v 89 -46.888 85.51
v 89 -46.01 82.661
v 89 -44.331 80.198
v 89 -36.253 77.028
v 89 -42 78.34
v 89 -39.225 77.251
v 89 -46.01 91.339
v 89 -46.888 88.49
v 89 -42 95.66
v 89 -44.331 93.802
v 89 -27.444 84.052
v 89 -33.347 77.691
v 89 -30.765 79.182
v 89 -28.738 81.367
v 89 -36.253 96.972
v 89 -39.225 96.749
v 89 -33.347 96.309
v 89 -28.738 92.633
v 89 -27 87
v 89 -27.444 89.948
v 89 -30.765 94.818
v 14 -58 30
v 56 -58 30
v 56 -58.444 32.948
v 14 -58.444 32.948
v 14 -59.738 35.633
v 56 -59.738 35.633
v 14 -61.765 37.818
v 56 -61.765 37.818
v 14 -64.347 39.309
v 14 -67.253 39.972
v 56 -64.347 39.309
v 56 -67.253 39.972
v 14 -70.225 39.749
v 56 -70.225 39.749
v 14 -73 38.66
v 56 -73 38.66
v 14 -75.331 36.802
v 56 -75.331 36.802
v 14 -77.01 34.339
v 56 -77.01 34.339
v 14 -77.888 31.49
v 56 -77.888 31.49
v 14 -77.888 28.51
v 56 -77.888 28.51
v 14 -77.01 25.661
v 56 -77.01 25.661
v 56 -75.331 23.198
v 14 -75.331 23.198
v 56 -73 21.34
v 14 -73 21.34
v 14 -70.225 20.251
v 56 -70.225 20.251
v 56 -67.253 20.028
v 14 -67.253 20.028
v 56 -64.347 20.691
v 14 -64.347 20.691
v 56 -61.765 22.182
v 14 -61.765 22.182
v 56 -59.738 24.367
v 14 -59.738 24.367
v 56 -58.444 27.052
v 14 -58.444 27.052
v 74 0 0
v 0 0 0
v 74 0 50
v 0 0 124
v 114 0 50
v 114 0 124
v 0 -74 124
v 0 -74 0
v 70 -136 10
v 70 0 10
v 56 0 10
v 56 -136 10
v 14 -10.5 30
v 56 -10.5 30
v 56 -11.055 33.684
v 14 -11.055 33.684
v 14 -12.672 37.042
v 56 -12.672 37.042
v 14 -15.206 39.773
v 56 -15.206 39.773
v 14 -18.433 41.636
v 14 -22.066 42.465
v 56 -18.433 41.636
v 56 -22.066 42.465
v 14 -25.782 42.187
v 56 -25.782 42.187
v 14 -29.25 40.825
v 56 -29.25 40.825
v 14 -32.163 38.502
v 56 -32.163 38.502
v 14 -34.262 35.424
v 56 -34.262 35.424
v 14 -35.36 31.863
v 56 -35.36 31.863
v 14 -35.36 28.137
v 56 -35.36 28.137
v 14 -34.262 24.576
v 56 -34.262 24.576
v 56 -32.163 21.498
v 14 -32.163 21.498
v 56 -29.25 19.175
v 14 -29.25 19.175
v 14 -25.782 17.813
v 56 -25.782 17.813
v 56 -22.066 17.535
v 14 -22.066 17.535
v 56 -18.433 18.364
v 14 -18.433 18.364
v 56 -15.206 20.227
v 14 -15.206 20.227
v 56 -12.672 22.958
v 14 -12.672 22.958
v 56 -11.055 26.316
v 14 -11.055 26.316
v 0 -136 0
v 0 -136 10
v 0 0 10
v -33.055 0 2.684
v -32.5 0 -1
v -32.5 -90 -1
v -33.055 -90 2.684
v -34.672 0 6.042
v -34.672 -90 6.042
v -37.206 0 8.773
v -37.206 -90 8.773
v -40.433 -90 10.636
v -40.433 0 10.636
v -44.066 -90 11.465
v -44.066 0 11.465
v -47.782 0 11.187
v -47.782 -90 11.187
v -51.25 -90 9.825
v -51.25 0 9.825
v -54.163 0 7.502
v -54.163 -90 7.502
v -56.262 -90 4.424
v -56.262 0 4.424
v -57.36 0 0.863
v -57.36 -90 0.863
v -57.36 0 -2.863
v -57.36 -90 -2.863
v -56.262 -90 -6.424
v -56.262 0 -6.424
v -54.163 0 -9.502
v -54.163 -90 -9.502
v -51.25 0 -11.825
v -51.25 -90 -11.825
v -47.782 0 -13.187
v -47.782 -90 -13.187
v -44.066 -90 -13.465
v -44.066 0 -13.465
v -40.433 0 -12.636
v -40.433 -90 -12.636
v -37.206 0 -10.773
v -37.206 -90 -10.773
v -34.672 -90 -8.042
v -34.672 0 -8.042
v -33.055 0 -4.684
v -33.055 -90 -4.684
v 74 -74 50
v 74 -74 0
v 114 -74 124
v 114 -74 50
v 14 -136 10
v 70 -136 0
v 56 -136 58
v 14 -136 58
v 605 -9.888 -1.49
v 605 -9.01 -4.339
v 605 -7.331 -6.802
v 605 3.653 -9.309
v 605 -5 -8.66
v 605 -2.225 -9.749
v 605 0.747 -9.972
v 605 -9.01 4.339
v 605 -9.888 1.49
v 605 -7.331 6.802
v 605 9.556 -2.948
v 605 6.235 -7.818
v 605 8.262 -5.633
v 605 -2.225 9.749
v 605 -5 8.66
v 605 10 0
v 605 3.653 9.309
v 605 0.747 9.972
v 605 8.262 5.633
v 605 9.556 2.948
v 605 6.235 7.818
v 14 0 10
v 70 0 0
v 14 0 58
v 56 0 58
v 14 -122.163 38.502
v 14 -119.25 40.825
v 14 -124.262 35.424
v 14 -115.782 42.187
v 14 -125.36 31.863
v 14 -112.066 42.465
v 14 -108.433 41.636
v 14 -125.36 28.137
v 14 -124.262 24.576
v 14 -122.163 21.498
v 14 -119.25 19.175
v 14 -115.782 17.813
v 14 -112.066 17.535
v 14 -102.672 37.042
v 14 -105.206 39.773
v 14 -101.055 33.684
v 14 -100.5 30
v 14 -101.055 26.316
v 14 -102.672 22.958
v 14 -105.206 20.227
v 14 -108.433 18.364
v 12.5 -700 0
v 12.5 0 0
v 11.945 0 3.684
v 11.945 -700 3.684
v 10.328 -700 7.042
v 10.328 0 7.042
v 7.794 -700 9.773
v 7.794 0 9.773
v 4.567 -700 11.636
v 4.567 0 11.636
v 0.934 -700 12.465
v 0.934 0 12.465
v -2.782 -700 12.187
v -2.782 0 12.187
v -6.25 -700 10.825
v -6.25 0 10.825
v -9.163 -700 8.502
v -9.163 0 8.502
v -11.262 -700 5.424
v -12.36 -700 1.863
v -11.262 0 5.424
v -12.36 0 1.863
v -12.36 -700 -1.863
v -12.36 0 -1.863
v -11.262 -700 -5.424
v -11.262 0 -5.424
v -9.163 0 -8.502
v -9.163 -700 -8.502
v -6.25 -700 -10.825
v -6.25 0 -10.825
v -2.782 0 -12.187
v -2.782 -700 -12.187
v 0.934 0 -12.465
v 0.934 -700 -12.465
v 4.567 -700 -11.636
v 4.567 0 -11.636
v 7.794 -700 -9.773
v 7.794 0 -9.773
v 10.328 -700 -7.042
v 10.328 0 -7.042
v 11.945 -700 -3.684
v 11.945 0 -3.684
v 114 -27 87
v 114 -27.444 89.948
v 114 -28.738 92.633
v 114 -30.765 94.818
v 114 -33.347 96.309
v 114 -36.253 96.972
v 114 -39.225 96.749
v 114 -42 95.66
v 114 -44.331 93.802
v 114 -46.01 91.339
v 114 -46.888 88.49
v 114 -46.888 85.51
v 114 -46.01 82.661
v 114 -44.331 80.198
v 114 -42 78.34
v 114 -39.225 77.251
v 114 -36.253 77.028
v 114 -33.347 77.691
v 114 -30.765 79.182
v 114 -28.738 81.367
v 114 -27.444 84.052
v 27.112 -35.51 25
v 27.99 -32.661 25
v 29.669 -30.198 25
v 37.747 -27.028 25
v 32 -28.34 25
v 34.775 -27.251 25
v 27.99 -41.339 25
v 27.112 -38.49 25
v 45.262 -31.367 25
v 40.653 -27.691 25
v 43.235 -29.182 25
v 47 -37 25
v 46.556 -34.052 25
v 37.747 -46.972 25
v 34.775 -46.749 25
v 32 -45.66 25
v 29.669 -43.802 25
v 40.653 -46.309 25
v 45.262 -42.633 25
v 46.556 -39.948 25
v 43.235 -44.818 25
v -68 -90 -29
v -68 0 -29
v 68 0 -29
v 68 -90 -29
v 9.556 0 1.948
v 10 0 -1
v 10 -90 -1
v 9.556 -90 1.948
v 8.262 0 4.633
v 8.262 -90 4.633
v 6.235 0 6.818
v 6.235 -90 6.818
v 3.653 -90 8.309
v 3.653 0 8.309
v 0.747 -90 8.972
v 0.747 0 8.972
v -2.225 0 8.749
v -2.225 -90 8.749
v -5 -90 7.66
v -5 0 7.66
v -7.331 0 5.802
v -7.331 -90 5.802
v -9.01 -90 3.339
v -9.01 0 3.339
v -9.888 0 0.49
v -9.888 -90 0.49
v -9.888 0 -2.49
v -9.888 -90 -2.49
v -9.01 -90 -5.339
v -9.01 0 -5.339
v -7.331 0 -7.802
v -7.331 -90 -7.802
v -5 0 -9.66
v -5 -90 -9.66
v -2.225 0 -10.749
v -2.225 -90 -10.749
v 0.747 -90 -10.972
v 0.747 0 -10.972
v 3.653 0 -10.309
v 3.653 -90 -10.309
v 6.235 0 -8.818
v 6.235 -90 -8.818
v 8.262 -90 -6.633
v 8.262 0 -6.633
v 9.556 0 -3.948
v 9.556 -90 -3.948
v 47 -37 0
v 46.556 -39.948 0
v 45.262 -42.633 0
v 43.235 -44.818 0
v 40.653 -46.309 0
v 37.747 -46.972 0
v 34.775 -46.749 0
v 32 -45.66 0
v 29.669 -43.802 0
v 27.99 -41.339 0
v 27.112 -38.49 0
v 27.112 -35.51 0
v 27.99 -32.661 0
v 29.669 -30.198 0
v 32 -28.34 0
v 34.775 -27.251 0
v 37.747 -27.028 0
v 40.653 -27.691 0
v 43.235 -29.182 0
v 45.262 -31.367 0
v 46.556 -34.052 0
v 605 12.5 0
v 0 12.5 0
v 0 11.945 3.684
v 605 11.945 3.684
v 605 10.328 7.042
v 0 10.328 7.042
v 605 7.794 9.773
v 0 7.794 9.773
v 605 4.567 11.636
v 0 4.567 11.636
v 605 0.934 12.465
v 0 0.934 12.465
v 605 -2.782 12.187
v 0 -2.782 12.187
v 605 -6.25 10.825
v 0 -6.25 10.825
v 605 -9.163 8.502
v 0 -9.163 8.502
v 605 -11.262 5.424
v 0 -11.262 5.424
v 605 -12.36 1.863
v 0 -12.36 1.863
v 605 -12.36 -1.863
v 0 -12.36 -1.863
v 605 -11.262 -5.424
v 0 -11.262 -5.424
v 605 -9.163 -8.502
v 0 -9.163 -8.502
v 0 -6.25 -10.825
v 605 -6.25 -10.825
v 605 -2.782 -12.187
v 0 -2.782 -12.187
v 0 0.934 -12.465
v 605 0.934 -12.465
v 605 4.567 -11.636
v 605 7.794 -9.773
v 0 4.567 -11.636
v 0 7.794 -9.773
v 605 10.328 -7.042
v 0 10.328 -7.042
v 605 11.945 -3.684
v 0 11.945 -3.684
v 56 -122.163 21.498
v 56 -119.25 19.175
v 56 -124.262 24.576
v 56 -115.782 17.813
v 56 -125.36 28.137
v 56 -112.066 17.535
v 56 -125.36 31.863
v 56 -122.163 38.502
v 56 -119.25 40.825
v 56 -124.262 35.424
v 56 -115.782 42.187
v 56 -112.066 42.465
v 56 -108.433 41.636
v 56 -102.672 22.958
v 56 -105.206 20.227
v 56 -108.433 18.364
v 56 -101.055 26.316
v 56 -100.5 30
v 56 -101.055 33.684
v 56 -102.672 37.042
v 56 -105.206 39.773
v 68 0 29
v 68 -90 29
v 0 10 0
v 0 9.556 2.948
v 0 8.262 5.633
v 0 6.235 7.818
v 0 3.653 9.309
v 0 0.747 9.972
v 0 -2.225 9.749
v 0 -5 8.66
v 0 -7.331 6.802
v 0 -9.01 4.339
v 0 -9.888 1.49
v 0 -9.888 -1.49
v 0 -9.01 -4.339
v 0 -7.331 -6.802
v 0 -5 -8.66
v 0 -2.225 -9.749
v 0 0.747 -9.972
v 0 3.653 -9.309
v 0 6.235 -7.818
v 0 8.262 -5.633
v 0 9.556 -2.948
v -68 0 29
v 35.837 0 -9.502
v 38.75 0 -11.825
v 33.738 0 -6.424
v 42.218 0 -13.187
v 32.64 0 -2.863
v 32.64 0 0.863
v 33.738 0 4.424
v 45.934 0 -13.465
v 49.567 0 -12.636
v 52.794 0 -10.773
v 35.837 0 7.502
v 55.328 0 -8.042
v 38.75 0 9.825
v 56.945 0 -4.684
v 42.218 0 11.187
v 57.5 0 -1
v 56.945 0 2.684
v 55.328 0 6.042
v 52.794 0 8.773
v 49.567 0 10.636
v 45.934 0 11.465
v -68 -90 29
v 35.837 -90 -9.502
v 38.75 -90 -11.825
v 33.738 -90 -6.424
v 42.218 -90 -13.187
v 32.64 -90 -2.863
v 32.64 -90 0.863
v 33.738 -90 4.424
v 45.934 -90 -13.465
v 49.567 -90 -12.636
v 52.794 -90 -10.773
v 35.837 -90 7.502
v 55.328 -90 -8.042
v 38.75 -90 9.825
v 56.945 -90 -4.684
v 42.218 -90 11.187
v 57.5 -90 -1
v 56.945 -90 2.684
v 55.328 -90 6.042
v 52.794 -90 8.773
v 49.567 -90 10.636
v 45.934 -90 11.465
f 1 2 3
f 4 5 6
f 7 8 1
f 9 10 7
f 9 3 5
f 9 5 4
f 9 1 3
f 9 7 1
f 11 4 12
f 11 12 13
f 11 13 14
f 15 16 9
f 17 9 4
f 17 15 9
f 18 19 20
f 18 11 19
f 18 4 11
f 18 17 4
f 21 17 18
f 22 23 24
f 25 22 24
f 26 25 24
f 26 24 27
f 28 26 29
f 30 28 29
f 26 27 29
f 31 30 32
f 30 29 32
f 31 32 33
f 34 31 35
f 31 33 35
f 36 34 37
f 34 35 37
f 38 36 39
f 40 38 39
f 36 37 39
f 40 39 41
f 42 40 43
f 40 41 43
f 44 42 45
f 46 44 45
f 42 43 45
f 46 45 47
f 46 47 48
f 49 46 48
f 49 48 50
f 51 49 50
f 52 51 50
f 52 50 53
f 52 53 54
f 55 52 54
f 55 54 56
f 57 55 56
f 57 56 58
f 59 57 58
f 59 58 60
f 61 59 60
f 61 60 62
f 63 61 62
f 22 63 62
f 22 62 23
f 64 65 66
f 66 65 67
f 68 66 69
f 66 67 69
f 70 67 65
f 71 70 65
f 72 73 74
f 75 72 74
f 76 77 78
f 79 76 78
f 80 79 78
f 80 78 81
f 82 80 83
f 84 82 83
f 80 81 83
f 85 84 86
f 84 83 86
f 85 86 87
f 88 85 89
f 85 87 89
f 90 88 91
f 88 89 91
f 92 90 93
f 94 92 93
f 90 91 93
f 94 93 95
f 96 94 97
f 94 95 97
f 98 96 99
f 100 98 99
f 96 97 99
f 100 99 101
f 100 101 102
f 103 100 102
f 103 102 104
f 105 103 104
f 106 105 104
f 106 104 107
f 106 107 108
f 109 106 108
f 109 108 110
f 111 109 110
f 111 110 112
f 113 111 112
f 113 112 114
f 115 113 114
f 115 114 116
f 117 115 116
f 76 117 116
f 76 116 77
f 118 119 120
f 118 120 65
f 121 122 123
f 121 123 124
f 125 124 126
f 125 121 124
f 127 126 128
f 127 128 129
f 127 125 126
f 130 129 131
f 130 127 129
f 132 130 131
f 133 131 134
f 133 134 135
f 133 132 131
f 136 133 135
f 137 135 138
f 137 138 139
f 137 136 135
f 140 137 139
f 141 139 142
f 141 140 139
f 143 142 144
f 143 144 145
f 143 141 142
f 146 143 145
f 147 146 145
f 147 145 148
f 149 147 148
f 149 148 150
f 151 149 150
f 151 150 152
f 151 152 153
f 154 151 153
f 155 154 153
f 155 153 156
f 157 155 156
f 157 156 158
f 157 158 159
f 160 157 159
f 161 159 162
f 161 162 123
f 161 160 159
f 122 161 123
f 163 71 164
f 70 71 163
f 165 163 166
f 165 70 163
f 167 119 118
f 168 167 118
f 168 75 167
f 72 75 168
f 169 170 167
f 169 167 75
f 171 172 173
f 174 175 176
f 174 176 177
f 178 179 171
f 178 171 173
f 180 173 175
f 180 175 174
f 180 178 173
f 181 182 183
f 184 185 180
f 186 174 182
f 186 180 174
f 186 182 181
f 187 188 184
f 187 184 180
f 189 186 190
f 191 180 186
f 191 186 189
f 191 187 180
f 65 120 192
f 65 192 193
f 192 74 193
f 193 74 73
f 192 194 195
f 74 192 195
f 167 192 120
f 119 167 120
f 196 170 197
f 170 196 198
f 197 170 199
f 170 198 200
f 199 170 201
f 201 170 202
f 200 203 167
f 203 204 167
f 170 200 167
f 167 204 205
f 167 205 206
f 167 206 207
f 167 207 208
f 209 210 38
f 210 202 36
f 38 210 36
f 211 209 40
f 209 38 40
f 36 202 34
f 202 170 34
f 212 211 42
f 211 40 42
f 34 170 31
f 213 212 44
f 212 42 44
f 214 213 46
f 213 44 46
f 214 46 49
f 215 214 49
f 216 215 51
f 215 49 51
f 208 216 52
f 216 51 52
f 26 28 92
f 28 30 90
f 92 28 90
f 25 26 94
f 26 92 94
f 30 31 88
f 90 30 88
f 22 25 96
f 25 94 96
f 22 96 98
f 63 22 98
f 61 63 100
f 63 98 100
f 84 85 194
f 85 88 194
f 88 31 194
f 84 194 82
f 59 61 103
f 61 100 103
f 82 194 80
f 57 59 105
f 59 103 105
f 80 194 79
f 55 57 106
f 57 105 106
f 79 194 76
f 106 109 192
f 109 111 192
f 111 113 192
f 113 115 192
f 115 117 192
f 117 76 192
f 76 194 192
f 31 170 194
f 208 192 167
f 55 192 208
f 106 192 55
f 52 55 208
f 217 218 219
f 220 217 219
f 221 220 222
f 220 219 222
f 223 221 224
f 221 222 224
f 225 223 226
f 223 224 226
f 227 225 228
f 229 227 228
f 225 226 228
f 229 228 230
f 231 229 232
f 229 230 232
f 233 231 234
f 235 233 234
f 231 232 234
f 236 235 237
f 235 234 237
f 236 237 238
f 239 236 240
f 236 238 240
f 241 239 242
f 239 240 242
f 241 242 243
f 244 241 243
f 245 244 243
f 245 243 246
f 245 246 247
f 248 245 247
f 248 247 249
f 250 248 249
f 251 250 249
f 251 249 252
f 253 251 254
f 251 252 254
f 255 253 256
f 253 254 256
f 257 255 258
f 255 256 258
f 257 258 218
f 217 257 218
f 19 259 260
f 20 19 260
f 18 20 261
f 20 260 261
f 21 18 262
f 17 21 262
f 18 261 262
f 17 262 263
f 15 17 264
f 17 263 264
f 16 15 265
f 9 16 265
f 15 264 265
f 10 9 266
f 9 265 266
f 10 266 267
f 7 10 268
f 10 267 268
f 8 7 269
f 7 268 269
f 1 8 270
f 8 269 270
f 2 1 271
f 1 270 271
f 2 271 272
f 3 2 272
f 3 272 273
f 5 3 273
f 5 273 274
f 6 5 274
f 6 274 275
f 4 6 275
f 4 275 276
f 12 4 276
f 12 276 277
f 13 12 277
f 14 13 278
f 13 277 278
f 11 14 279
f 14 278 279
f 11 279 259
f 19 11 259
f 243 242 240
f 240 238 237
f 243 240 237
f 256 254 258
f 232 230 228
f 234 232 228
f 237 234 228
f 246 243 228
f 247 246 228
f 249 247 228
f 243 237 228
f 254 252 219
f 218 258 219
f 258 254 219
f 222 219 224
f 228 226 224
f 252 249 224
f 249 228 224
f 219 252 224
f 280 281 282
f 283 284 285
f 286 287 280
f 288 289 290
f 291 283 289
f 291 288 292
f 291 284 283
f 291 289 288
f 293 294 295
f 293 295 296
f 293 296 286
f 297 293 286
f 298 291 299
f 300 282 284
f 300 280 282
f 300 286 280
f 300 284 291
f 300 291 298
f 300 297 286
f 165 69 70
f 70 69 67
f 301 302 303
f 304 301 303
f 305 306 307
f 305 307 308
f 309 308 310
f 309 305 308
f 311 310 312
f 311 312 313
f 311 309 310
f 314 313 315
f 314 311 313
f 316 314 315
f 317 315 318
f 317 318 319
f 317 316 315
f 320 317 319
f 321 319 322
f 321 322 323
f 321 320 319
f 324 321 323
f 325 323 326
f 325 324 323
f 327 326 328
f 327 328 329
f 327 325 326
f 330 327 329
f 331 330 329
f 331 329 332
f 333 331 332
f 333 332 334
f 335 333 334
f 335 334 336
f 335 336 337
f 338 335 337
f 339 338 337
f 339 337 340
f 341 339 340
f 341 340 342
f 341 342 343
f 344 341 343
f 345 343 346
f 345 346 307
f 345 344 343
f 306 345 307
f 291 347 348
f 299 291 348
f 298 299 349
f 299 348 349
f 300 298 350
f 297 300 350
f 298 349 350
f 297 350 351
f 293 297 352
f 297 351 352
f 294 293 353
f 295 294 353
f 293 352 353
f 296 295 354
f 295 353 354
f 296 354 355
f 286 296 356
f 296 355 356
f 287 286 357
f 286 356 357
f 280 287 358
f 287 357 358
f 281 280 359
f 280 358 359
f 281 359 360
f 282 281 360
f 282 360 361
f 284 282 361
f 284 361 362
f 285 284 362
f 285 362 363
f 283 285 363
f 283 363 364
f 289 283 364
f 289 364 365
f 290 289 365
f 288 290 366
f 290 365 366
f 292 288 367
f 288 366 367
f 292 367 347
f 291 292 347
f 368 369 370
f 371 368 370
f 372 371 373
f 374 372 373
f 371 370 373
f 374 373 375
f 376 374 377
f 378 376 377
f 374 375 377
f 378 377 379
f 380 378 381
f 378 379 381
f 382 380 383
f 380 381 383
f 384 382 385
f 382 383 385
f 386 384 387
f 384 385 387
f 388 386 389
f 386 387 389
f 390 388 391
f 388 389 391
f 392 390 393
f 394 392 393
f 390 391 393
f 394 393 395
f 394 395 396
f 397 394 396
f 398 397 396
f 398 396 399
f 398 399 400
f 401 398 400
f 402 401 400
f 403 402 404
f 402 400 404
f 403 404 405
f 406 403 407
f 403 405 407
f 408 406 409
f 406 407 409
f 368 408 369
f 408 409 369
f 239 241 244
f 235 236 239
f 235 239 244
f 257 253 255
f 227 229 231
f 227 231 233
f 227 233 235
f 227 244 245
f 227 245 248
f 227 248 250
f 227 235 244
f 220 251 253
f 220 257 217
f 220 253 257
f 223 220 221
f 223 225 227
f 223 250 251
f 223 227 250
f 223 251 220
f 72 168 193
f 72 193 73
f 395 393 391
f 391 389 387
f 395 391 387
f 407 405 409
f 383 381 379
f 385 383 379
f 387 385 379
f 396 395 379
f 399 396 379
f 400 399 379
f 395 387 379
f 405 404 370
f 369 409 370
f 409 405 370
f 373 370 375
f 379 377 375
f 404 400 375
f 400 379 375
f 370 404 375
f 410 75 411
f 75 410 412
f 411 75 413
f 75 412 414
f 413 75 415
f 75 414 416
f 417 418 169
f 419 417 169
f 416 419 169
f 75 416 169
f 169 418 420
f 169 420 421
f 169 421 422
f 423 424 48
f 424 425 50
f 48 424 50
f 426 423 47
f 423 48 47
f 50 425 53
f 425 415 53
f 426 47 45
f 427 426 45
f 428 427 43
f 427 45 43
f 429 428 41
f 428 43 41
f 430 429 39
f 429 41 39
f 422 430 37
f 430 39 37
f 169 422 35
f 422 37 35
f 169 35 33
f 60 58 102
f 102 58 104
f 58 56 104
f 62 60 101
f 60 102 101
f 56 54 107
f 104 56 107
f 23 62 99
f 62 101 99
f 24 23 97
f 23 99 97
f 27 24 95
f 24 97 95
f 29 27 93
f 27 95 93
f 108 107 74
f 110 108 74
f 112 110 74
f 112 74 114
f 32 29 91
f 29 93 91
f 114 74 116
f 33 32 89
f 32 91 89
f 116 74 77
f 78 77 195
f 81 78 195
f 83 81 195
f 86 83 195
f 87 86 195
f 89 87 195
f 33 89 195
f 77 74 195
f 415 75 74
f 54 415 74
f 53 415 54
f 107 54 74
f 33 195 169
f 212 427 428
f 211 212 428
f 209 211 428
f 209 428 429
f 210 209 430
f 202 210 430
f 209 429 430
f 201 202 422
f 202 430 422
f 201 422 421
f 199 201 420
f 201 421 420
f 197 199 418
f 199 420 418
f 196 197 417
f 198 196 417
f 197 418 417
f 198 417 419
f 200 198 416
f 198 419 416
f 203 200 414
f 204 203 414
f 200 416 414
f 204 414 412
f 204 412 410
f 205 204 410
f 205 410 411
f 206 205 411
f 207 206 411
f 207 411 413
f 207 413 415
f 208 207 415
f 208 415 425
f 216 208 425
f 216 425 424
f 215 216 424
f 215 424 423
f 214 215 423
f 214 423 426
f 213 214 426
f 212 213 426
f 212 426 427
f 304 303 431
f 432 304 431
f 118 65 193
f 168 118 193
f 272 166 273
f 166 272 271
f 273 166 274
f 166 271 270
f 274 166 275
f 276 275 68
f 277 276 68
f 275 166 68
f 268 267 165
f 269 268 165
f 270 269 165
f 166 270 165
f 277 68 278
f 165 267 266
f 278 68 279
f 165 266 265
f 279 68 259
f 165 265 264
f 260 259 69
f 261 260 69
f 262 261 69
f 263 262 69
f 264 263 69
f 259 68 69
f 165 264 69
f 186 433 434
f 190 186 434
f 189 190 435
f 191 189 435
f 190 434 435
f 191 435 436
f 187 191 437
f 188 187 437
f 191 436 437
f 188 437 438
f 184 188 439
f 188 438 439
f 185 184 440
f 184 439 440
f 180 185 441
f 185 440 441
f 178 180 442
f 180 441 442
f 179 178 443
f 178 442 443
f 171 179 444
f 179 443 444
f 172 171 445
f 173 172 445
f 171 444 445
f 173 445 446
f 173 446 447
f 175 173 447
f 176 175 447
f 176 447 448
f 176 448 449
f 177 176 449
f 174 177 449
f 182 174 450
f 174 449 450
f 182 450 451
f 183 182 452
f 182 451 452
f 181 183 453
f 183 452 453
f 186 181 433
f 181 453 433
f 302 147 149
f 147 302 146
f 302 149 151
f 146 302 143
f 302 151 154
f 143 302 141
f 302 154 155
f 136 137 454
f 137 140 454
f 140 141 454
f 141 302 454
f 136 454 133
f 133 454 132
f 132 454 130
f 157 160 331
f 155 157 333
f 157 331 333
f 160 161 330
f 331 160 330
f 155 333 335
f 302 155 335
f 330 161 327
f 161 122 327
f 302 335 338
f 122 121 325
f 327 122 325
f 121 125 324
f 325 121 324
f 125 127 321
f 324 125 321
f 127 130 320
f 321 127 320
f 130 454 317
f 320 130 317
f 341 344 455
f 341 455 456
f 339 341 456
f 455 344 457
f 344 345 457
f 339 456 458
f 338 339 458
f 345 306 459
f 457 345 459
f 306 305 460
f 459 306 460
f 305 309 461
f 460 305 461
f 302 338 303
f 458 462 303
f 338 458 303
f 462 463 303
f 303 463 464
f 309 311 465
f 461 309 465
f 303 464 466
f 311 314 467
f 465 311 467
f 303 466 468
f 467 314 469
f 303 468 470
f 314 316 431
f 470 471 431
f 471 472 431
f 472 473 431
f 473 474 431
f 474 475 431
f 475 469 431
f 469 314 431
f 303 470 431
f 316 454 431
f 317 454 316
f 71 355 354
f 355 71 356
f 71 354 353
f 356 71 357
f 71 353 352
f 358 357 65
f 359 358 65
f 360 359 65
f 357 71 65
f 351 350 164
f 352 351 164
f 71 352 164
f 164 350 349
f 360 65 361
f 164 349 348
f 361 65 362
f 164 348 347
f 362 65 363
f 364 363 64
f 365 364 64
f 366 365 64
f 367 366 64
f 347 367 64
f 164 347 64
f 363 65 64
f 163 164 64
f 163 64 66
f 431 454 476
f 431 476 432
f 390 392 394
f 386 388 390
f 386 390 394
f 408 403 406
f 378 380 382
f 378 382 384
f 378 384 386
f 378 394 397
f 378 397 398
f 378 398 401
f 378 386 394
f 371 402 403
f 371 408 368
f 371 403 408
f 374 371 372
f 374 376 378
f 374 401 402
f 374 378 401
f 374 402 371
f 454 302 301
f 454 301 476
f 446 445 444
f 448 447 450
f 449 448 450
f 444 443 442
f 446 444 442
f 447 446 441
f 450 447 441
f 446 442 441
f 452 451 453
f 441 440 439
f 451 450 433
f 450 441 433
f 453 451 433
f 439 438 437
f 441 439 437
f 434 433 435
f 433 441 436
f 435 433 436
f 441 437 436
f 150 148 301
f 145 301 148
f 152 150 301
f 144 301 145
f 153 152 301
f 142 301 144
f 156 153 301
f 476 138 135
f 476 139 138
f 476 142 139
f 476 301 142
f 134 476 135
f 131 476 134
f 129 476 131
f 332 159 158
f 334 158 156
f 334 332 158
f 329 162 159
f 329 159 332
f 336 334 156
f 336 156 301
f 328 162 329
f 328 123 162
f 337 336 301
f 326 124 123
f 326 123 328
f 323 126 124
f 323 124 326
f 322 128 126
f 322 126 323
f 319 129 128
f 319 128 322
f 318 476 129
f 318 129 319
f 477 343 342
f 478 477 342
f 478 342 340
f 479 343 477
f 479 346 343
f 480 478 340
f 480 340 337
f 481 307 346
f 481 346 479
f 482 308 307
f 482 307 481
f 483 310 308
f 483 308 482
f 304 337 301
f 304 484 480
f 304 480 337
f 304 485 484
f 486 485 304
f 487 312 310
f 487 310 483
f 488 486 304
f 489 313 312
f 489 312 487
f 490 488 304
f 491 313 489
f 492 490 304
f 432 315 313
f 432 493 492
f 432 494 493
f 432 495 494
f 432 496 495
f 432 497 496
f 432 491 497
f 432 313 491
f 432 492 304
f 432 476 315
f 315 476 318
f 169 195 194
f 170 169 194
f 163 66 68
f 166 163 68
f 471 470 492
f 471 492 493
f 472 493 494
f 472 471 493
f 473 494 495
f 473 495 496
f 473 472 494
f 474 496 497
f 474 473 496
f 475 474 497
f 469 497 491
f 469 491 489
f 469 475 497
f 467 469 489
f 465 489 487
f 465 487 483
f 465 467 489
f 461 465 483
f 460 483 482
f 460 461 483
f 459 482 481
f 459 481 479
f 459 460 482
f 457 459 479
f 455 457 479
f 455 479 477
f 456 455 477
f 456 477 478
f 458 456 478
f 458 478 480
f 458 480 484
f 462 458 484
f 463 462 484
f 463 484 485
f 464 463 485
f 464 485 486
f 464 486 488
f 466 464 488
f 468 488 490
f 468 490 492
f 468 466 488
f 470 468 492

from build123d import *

# Parameters (mm, degrees)
F1_DEPTH  = 136
F2_R      = 12.5
F2_R_2    = 10
F3_DEPTH  = 56.001
F4_R      = 10
F5_DEPTH  = 605
F4_R_2    = 12.5
F6_DEPTH  = 605
F7_W      = 136
F7_H      = 58
F7_R      = 12.5
F7_R_2    = 10
F8_DEPTH  = 90
F10_DEPTH = 74
F11_R     = 10
F12_DEPTH = 25
F13_R     = 10
F14_DEPTH = 25
F15_R     = 12.5
F16_DEPTH = 700


with BuildPart() as f1:
    # F0 (on Front) → F1 (new body)
    with BuildSketch(Plane.XZ):
        Polygon((0, 10), (0, 0), (70, 0), (70, 10), (56, 10), (56, 58), (14, 58), (14, 10), align=None)
    extrude(amount=F1_DEPTH)

    # F2 (on face) → F3 (cut, through all)
    with BuildSketch(Plane.YZ.offset(56)):
        with Locations((-113, 30)):
            Circle(F2_R)
        with Locations((-68, 30)):
            Circle(F2_R_2)
        with Locations((-23, 30)):
            Circle(F2_R)
    extrude(amount=-F3_DEPTH, mode=Mode.SUBTRACT)


with BuildPart() as f5:
    # F4 (on Right) → F5 (new body)
    with BuildSketch(Plane.YZ):
        Circle(F4_R)
    extrude(amount=F5_DEPTH)


with BuildPart() as f6:
    # F4 (on Right) → F6 (new body)
    with BuildSketch(Plane.YZ):
        Circle(F4_R_2)
        Circle(F4_R, mode=Mode.SUBTRACT)
        Circle(F4_R)
    extrude(amount=F6_DEPTH)


with BuildPart() as f8:
    # F7 (on Front) → F8 (new body)
    with BuildSketch(Plane.XZ):
        Rectangle(F7_W, F7_H)
        with Locations((-45, -1)):
            Circle(F7_R, mode=Mode.SUBTRACT)
        with Locations((0, -1)):
            Circle(F7_R_2, mode=Mode.SUBTRACT)
        with Locations((45, -1)):
            Circle(F7_R, mode=Mode.SUBTRACT)
    extrude(amount=F8_DEPTH)


with BuildPart() as f10:
    # F9 (on Front) → F10 (new body)
    with BuildSketch(Plane.XZ):
        Polygon((0, 124), (0, 0), (74, 0), (74, 50), (114, 50), (114, 124), align=None)
    extrude(amount=F10_DEPTH)

    # F11 (on face) → F12 (cut)
    with BuildSketch(Plane(origin=(0, 0, 0), x_dir=(1, 0, 0), z_dir=(0, 0, -1))):
        with Locations((37, 37)):
            Circle(F11_R)
    extrude(amount=-F12_DEPTH, mode=Mode.SUBTRACT)

    # F13 (on face) → F14 (cut)
    with BuildSketch(Plane.YZ.offset(114)):
        with Locations((-37, 87)):
            Circle(F13_R)
    extrude(amount=-F14_DEPTH, mode=Mode.SUBTRACT)


with BuildPart() as f16:
    # F15 (on Front) → F16 (new body)
    with BuildSketch(Plane.XZ):
        Circle(F15_R)
    extrude(amount=F16_DEPTH)


solid = Compound([f1.part, f5.part, f6.part, f8.part, f10.part, f16.part])
